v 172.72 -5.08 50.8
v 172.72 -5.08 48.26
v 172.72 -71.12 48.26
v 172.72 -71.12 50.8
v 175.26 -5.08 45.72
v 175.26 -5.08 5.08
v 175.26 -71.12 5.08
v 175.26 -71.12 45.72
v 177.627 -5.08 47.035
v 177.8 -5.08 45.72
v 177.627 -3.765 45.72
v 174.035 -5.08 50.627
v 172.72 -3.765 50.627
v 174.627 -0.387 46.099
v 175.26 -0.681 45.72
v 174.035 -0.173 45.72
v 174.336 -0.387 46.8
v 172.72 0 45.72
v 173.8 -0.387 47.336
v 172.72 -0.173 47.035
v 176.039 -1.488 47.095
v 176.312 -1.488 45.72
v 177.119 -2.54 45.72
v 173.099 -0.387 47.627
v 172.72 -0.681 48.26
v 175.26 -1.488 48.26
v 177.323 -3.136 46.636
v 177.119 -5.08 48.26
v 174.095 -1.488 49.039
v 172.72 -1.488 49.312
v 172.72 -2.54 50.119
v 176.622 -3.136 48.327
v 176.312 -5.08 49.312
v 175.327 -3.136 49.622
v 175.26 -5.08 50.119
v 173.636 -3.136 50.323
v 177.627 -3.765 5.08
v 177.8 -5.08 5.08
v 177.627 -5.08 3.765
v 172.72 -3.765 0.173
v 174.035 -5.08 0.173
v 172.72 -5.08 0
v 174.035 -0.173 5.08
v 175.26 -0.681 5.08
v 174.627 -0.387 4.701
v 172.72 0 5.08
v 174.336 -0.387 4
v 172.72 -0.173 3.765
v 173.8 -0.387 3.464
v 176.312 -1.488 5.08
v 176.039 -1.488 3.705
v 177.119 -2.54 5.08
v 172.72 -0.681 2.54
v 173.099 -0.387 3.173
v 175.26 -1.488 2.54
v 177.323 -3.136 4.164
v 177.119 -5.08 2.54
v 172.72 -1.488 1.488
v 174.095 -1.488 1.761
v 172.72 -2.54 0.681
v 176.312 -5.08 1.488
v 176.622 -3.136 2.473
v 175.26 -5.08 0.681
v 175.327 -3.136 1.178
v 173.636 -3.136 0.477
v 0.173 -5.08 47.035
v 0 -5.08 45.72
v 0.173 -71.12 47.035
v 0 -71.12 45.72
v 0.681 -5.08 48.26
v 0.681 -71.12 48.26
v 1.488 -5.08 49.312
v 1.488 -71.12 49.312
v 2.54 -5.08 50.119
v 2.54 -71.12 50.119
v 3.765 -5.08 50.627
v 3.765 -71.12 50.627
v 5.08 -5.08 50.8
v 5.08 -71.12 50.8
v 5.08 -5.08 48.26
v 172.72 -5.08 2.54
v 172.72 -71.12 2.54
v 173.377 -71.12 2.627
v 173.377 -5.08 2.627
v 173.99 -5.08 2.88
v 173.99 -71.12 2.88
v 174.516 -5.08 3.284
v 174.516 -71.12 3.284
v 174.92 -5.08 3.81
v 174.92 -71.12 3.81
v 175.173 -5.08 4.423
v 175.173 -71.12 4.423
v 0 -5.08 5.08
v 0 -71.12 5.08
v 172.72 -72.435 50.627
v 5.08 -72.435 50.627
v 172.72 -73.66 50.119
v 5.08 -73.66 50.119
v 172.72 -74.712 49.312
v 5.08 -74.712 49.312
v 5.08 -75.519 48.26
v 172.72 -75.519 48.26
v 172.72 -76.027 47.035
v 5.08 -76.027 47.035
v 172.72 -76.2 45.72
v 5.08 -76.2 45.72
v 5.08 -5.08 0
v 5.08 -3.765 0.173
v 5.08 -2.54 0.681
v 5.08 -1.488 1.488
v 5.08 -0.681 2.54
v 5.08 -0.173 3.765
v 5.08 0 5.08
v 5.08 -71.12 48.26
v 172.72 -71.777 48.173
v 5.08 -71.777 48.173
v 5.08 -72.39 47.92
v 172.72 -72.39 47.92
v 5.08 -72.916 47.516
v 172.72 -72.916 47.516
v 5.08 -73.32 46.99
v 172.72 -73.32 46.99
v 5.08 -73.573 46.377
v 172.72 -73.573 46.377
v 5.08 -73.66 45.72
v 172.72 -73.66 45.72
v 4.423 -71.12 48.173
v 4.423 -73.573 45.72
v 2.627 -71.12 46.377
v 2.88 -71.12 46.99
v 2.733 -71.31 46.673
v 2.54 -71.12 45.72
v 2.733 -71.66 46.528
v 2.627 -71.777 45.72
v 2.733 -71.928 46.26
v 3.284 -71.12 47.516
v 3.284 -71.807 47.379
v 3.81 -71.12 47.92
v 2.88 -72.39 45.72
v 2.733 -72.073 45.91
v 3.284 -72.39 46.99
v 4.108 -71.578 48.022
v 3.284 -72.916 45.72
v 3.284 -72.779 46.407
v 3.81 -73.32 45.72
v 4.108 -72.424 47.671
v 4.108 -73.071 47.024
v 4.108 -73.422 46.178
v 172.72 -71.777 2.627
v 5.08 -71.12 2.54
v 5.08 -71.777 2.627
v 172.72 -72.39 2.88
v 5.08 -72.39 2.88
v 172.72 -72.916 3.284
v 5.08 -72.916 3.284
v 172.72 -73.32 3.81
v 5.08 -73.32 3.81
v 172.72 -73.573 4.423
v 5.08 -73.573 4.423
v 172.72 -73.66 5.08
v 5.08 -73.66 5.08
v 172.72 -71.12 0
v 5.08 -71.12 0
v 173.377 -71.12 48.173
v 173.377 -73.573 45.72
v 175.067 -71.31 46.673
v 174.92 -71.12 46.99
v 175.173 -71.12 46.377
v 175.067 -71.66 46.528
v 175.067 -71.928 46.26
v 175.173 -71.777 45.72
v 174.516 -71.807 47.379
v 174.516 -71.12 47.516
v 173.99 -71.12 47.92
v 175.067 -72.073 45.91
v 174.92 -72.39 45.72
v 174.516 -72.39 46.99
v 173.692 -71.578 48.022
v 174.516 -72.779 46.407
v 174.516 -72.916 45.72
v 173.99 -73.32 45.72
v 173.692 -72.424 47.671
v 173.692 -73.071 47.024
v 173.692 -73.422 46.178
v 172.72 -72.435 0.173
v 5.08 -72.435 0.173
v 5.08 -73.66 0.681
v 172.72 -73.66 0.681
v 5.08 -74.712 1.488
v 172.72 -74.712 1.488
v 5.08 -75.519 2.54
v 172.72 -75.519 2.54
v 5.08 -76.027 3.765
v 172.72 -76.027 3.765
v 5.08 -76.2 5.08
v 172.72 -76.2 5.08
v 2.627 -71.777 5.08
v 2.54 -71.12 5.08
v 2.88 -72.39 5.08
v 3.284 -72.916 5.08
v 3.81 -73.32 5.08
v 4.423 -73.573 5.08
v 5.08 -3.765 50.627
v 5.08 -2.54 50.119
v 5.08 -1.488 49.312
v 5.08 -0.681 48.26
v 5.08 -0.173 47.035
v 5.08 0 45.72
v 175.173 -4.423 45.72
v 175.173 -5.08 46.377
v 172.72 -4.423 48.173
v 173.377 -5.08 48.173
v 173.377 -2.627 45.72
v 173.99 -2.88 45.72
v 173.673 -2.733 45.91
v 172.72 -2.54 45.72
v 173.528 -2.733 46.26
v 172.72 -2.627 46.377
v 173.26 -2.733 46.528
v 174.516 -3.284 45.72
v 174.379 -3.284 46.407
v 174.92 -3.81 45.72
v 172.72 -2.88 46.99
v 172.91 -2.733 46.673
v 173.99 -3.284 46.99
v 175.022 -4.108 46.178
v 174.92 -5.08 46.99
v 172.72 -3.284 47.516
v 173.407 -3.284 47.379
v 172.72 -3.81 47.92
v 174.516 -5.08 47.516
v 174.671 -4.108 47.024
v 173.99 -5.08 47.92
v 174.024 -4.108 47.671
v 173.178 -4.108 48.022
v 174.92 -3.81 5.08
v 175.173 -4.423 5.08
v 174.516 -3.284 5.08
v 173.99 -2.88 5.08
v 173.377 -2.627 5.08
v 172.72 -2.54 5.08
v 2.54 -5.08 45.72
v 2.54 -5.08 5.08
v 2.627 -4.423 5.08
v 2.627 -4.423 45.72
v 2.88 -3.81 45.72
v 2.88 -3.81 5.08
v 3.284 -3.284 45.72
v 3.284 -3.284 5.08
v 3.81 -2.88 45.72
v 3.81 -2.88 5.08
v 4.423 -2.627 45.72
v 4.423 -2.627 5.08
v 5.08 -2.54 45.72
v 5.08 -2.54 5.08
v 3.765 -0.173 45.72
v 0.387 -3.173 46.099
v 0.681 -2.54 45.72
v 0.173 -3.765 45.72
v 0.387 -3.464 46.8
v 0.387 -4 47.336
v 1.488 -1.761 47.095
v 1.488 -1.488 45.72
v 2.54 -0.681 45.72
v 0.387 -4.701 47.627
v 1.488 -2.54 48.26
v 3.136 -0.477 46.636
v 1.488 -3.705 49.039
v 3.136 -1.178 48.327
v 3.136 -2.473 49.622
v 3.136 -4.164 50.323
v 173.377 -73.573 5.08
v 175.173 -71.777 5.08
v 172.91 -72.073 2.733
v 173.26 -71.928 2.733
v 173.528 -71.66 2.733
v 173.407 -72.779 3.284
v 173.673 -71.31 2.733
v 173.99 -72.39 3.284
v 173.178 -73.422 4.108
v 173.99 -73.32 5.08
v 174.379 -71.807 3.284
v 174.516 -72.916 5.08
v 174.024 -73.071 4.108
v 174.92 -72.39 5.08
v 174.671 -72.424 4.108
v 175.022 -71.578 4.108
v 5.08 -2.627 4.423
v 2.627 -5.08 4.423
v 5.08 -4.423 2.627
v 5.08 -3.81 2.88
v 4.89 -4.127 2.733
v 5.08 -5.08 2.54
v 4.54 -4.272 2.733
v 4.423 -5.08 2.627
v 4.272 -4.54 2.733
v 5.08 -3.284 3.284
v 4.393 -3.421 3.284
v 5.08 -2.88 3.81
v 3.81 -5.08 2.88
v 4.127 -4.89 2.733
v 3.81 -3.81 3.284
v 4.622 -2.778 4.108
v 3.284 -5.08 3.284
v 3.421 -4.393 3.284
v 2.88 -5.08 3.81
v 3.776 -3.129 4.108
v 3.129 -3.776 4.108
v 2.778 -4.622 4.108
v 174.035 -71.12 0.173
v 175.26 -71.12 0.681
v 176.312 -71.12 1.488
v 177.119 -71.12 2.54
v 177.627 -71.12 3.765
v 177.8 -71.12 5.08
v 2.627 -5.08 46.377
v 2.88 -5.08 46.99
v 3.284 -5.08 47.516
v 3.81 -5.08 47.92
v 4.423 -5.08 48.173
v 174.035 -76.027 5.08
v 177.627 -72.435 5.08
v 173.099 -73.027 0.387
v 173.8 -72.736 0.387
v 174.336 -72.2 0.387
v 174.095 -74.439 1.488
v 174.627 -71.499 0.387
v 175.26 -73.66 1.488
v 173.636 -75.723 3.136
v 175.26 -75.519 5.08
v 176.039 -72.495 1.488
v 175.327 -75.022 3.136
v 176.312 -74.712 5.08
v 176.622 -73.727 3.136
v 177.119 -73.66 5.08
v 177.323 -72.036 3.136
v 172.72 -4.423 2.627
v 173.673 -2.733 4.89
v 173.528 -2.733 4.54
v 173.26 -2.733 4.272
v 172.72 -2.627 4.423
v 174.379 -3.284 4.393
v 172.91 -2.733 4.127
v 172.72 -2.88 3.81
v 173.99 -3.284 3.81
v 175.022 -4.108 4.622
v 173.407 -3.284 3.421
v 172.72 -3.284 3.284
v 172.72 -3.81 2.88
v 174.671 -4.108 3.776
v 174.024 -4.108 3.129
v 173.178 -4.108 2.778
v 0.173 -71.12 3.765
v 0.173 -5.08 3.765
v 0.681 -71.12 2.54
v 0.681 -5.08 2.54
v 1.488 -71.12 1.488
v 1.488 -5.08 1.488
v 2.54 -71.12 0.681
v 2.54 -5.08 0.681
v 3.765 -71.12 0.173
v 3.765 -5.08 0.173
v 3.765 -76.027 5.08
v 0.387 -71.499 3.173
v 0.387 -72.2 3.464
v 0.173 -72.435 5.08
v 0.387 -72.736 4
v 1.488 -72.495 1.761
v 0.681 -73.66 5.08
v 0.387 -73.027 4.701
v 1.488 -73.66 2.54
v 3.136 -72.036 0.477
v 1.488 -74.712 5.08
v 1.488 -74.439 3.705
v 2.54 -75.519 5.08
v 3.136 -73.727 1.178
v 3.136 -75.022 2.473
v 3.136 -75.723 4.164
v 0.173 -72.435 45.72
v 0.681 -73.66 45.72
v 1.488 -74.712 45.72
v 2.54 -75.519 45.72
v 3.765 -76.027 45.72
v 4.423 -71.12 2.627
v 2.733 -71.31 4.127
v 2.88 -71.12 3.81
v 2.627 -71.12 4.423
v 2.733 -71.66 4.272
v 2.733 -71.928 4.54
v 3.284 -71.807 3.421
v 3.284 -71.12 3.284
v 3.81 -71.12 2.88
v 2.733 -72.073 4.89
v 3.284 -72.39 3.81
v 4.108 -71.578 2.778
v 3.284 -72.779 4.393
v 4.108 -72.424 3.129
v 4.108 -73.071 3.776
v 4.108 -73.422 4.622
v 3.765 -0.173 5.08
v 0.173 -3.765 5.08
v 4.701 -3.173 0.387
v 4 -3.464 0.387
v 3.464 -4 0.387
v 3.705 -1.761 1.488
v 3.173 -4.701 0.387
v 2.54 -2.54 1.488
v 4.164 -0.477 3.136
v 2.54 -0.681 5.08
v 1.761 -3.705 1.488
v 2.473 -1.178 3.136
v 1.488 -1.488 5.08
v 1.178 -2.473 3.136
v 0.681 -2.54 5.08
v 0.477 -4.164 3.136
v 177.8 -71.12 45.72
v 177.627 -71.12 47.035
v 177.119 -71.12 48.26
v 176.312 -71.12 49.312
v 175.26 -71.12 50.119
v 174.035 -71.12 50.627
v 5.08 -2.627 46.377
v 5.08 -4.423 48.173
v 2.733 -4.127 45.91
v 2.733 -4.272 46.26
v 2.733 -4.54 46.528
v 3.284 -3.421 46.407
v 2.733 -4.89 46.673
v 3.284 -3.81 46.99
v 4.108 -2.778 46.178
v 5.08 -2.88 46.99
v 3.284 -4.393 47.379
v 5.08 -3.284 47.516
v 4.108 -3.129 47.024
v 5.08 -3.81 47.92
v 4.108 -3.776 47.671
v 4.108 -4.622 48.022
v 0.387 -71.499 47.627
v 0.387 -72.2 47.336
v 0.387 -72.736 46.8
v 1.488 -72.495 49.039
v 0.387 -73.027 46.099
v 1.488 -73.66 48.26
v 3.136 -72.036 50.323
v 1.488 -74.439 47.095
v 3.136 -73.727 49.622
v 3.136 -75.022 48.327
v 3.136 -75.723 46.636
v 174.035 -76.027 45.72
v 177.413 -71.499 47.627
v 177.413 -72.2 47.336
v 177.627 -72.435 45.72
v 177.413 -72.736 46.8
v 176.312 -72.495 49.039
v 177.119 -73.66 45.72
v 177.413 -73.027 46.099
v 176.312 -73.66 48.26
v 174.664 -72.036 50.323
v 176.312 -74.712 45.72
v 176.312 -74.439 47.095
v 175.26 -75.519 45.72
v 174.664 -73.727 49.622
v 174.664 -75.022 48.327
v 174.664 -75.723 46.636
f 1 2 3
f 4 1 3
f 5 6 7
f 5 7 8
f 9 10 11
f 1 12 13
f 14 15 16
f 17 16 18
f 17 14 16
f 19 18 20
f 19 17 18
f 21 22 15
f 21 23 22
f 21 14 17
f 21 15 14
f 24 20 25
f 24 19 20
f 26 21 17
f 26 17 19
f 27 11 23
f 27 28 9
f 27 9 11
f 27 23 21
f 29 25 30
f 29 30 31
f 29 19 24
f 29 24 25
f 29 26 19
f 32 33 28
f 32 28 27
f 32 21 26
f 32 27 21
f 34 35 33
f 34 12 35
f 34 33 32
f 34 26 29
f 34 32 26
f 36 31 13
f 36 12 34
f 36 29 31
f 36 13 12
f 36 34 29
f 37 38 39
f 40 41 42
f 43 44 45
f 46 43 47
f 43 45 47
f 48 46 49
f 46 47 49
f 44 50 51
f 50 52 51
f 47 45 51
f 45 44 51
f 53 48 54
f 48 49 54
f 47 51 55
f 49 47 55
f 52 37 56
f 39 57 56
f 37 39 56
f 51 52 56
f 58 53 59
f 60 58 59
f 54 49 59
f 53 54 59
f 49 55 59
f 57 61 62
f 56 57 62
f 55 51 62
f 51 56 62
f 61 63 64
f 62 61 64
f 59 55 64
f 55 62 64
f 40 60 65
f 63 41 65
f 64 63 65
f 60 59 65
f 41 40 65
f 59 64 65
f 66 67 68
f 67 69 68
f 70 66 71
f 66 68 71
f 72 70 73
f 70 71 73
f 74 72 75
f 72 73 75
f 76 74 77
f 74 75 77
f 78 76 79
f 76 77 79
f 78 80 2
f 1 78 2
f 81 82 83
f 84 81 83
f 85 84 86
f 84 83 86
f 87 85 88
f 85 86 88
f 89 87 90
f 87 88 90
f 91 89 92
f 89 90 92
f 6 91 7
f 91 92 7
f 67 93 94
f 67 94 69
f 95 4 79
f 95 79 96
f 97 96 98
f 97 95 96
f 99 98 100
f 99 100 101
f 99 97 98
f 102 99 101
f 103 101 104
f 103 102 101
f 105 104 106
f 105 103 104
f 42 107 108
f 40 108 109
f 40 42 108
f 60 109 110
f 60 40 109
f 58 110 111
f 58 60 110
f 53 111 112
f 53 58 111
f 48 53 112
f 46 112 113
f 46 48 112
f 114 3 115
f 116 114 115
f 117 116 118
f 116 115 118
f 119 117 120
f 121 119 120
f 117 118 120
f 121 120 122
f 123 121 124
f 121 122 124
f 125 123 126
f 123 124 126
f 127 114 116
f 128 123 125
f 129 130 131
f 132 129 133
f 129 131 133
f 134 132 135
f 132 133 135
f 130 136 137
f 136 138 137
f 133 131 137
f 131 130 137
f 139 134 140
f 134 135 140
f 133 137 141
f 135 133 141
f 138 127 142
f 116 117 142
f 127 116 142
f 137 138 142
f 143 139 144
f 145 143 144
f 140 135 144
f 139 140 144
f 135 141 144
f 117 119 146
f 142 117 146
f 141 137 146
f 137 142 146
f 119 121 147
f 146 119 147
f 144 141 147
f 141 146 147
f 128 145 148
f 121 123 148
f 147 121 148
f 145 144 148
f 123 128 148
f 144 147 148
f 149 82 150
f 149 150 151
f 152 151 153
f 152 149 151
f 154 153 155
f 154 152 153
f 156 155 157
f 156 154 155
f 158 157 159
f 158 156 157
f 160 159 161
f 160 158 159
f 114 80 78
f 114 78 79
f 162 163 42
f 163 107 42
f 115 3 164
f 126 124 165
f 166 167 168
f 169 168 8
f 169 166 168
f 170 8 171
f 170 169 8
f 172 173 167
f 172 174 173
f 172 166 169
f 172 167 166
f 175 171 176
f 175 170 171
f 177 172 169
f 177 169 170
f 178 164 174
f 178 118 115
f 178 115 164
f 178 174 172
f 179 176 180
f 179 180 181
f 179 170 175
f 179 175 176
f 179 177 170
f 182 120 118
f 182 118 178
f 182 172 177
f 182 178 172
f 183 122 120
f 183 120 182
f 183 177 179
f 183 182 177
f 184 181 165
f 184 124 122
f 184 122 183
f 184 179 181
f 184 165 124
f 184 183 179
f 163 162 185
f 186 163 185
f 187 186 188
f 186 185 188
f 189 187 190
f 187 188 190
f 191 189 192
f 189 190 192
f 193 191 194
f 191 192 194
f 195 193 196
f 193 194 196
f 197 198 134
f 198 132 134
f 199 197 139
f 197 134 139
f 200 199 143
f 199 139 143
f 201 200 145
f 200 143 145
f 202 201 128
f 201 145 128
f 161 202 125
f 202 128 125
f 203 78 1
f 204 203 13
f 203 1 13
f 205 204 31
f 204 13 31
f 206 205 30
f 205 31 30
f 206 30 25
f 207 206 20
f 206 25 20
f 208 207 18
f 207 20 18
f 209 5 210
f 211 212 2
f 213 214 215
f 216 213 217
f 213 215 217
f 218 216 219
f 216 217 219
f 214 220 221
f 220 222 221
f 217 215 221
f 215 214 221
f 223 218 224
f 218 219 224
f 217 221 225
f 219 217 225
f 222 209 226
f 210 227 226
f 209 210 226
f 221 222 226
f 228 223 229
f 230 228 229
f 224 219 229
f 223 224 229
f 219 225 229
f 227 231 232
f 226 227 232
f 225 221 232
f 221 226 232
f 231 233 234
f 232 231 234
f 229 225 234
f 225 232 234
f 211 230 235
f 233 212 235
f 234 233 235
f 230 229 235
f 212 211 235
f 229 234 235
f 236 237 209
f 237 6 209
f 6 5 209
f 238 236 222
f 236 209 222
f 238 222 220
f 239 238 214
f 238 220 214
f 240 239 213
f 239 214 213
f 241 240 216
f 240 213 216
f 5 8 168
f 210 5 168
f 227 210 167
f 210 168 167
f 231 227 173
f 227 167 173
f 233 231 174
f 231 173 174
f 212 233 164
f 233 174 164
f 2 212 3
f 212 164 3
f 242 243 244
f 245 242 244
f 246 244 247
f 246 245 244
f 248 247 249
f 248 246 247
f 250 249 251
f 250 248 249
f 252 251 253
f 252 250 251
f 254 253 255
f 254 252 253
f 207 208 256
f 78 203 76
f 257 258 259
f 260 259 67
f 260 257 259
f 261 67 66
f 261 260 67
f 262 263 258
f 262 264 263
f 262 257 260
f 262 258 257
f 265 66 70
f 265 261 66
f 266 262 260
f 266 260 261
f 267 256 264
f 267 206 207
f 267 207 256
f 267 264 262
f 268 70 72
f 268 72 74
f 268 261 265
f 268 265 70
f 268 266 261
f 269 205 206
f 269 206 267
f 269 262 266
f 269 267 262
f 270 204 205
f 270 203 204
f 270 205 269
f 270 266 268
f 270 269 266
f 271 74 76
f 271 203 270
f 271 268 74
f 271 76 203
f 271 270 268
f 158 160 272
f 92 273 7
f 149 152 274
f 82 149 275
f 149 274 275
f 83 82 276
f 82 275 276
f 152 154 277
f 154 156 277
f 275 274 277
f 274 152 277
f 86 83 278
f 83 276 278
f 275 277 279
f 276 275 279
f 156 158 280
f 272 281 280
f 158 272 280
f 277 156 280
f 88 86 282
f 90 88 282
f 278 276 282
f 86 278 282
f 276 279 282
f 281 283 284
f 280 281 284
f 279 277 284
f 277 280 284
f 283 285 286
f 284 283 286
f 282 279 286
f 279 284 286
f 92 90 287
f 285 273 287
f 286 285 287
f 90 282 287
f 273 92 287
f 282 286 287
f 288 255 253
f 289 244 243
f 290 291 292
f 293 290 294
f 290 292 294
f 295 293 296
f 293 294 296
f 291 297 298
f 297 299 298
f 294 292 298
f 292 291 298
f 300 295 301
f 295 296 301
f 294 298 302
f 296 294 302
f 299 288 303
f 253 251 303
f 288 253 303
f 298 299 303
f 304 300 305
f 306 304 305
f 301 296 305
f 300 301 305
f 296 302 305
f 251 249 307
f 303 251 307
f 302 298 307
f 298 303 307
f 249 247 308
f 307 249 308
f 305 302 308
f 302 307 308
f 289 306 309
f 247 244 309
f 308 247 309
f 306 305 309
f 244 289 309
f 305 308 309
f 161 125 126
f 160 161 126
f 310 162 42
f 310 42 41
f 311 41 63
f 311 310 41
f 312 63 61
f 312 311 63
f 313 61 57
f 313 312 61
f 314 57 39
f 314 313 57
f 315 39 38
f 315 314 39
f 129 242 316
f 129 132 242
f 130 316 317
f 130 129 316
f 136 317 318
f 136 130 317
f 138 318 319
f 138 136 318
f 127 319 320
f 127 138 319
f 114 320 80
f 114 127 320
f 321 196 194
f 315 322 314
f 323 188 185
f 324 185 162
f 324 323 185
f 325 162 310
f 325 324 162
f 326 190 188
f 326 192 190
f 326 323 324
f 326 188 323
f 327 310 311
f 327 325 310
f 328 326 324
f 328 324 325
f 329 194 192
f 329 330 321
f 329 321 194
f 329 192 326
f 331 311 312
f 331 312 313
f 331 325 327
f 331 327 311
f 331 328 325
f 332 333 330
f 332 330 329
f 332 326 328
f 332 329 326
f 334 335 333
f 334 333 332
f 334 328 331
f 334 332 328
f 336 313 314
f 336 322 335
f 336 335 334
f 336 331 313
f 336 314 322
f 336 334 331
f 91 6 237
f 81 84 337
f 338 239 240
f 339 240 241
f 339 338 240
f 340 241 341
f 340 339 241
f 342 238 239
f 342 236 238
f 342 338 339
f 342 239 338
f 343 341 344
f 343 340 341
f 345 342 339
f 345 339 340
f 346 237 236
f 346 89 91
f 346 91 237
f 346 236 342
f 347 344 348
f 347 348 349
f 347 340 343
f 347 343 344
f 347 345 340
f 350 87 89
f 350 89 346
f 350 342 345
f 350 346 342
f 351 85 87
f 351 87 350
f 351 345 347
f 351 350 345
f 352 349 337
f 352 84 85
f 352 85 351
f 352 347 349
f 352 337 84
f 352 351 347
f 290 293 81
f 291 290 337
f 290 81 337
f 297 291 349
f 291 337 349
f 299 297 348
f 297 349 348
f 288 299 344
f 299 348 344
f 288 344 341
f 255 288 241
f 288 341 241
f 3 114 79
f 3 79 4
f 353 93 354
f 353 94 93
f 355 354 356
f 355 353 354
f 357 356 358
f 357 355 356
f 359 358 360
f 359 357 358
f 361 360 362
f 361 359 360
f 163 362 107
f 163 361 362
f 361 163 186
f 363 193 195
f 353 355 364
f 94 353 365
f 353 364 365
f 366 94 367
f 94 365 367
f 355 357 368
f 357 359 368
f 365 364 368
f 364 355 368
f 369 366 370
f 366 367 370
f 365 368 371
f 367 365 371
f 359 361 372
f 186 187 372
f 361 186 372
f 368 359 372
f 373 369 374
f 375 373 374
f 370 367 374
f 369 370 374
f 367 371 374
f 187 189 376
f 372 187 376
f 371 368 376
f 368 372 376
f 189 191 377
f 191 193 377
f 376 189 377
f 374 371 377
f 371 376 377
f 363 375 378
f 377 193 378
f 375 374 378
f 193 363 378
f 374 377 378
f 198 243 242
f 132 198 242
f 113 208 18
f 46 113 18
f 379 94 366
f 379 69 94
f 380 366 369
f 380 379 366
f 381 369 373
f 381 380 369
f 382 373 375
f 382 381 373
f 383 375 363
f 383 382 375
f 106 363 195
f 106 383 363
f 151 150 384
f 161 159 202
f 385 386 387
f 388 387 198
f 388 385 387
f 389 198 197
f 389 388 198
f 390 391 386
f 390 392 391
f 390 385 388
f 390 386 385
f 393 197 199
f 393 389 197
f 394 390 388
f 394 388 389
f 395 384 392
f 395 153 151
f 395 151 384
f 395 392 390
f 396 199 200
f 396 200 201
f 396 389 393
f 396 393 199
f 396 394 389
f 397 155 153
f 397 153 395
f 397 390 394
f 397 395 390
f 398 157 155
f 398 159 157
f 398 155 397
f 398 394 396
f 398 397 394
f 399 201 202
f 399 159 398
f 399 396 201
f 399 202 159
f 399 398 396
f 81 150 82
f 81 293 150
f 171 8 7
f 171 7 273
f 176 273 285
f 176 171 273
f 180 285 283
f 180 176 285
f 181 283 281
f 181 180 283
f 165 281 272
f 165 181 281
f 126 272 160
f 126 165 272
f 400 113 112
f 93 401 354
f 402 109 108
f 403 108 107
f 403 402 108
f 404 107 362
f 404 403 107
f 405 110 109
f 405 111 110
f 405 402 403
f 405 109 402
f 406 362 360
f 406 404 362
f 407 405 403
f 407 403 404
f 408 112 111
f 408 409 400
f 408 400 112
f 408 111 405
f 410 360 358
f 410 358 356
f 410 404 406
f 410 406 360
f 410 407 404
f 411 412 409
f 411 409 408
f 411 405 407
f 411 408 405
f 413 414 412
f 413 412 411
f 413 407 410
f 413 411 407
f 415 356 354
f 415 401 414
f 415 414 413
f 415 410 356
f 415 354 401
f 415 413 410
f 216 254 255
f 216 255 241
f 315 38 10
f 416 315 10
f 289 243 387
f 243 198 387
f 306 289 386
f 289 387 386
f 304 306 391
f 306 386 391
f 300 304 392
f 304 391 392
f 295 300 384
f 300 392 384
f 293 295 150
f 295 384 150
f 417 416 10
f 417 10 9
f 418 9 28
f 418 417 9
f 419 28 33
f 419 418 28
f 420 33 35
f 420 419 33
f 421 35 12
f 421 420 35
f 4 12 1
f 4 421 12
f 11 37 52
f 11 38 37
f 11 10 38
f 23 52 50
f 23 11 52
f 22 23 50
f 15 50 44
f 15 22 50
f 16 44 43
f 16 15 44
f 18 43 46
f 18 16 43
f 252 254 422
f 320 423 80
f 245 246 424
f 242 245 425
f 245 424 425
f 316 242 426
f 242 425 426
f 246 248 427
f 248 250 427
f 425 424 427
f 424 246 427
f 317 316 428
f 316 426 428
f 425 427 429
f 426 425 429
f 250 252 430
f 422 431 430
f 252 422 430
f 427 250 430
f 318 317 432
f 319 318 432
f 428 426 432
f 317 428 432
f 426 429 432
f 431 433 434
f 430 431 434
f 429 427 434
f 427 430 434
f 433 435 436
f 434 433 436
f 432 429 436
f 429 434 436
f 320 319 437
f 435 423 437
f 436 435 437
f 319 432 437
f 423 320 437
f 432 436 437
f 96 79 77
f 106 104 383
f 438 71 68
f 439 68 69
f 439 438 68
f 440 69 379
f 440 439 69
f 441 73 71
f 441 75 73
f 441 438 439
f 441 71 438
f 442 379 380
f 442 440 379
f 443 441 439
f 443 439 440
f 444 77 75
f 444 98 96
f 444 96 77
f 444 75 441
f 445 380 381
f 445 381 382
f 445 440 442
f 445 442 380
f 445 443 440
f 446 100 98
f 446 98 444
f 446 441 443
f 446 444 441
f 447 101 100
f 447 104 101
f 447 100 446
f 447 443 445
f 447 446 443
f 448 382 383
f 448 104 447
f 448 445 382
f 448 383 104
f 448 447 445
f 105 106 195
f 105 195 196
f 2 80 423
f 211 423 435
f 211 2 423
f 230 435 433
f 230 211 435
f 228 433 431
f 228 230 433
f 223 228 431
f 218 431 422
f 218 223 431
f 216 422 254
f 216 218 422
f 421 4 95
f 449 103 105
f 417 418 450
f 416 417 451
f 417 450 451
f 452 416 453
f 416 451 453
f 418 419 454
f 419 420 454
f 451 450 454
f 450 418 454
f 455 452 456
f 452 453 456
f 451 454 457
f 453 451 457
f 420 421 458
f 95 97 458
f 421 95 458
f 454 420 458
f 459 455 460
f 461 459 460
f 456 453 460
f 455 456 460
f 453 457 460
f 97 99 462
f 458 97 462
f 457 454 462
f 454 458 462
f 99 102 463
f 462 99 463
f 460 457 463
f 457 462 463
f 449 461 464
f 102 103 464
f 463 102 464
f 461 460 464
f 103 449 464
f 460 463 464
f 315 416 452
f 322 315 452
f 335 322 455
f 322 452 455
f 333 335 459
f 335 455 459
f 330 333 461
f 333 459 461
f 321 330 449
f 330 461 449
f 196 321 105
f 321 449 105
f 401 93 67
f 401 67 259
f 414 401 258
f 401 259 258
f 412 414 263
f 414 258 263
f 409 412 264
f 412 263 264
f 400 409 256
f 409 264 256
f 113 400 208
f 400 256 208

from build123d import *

# Parameters (mm, degrees)
F0_W     = 177.8
F0_H     = 50.8
F1_DEPTH = 76.2
F2_R     = 5.08
F3_T     = -2.54


# Not quite as in the source:
# - a shell that OpenCascade refuses in one call is made with other operations: the cavity is built on its own and cut out


with BuildPart() as f1:
    # F0 (on Front) → F1 (new body)
    with BuildSketch(Plane.XZ):
        with Locations((88.9, 25.4)):
            Rectangle(F0_W, F0_H)
    extrude(amount=F1_DEPTH)

    # F2
    f2_edges = [f1.edges().sort_by_distance(p)[0] for p in [
        (88.9, -76.2, 50.8),
        (177.8, -38.1, 50.8),
        (177.8, -76.2, 25.4),
        (88.9, -76.2, 0),
        (177.8, -38.1, 0),
        (177.8, 0, 25.4),
        (88.9, 0, 50.8),
        (0, 0, 25.4),
        (88.9, 0, 0),
        (0, -38.1, 50.8),
        (0, -38.1, 0),
        (0, -76.2, 25.4),
    ]]
    fillet(f2_edges, radius=F2_R)

    # F3: a shell. OpenCascade refuses it in one call, so the cavity is built on its own and cut out:
    # the body offset inwards by the wall thickness, plus a prism from it out through each open face.
    f3_core = offset(f1.part, amount=F3_T, mode=Mode.PRIVATE)
    f3_exits = [f3_core.faces().sort_by_distance(p)[0] for p in [
        (88.9, -38.1, 48.26),
    ]]
    add(f3_core, mode=Mode.SUBTRACT)
    extrude(f3_exits, amount=-F3_T, mode=Mode.SUBTRACT)


solid = f1.part
